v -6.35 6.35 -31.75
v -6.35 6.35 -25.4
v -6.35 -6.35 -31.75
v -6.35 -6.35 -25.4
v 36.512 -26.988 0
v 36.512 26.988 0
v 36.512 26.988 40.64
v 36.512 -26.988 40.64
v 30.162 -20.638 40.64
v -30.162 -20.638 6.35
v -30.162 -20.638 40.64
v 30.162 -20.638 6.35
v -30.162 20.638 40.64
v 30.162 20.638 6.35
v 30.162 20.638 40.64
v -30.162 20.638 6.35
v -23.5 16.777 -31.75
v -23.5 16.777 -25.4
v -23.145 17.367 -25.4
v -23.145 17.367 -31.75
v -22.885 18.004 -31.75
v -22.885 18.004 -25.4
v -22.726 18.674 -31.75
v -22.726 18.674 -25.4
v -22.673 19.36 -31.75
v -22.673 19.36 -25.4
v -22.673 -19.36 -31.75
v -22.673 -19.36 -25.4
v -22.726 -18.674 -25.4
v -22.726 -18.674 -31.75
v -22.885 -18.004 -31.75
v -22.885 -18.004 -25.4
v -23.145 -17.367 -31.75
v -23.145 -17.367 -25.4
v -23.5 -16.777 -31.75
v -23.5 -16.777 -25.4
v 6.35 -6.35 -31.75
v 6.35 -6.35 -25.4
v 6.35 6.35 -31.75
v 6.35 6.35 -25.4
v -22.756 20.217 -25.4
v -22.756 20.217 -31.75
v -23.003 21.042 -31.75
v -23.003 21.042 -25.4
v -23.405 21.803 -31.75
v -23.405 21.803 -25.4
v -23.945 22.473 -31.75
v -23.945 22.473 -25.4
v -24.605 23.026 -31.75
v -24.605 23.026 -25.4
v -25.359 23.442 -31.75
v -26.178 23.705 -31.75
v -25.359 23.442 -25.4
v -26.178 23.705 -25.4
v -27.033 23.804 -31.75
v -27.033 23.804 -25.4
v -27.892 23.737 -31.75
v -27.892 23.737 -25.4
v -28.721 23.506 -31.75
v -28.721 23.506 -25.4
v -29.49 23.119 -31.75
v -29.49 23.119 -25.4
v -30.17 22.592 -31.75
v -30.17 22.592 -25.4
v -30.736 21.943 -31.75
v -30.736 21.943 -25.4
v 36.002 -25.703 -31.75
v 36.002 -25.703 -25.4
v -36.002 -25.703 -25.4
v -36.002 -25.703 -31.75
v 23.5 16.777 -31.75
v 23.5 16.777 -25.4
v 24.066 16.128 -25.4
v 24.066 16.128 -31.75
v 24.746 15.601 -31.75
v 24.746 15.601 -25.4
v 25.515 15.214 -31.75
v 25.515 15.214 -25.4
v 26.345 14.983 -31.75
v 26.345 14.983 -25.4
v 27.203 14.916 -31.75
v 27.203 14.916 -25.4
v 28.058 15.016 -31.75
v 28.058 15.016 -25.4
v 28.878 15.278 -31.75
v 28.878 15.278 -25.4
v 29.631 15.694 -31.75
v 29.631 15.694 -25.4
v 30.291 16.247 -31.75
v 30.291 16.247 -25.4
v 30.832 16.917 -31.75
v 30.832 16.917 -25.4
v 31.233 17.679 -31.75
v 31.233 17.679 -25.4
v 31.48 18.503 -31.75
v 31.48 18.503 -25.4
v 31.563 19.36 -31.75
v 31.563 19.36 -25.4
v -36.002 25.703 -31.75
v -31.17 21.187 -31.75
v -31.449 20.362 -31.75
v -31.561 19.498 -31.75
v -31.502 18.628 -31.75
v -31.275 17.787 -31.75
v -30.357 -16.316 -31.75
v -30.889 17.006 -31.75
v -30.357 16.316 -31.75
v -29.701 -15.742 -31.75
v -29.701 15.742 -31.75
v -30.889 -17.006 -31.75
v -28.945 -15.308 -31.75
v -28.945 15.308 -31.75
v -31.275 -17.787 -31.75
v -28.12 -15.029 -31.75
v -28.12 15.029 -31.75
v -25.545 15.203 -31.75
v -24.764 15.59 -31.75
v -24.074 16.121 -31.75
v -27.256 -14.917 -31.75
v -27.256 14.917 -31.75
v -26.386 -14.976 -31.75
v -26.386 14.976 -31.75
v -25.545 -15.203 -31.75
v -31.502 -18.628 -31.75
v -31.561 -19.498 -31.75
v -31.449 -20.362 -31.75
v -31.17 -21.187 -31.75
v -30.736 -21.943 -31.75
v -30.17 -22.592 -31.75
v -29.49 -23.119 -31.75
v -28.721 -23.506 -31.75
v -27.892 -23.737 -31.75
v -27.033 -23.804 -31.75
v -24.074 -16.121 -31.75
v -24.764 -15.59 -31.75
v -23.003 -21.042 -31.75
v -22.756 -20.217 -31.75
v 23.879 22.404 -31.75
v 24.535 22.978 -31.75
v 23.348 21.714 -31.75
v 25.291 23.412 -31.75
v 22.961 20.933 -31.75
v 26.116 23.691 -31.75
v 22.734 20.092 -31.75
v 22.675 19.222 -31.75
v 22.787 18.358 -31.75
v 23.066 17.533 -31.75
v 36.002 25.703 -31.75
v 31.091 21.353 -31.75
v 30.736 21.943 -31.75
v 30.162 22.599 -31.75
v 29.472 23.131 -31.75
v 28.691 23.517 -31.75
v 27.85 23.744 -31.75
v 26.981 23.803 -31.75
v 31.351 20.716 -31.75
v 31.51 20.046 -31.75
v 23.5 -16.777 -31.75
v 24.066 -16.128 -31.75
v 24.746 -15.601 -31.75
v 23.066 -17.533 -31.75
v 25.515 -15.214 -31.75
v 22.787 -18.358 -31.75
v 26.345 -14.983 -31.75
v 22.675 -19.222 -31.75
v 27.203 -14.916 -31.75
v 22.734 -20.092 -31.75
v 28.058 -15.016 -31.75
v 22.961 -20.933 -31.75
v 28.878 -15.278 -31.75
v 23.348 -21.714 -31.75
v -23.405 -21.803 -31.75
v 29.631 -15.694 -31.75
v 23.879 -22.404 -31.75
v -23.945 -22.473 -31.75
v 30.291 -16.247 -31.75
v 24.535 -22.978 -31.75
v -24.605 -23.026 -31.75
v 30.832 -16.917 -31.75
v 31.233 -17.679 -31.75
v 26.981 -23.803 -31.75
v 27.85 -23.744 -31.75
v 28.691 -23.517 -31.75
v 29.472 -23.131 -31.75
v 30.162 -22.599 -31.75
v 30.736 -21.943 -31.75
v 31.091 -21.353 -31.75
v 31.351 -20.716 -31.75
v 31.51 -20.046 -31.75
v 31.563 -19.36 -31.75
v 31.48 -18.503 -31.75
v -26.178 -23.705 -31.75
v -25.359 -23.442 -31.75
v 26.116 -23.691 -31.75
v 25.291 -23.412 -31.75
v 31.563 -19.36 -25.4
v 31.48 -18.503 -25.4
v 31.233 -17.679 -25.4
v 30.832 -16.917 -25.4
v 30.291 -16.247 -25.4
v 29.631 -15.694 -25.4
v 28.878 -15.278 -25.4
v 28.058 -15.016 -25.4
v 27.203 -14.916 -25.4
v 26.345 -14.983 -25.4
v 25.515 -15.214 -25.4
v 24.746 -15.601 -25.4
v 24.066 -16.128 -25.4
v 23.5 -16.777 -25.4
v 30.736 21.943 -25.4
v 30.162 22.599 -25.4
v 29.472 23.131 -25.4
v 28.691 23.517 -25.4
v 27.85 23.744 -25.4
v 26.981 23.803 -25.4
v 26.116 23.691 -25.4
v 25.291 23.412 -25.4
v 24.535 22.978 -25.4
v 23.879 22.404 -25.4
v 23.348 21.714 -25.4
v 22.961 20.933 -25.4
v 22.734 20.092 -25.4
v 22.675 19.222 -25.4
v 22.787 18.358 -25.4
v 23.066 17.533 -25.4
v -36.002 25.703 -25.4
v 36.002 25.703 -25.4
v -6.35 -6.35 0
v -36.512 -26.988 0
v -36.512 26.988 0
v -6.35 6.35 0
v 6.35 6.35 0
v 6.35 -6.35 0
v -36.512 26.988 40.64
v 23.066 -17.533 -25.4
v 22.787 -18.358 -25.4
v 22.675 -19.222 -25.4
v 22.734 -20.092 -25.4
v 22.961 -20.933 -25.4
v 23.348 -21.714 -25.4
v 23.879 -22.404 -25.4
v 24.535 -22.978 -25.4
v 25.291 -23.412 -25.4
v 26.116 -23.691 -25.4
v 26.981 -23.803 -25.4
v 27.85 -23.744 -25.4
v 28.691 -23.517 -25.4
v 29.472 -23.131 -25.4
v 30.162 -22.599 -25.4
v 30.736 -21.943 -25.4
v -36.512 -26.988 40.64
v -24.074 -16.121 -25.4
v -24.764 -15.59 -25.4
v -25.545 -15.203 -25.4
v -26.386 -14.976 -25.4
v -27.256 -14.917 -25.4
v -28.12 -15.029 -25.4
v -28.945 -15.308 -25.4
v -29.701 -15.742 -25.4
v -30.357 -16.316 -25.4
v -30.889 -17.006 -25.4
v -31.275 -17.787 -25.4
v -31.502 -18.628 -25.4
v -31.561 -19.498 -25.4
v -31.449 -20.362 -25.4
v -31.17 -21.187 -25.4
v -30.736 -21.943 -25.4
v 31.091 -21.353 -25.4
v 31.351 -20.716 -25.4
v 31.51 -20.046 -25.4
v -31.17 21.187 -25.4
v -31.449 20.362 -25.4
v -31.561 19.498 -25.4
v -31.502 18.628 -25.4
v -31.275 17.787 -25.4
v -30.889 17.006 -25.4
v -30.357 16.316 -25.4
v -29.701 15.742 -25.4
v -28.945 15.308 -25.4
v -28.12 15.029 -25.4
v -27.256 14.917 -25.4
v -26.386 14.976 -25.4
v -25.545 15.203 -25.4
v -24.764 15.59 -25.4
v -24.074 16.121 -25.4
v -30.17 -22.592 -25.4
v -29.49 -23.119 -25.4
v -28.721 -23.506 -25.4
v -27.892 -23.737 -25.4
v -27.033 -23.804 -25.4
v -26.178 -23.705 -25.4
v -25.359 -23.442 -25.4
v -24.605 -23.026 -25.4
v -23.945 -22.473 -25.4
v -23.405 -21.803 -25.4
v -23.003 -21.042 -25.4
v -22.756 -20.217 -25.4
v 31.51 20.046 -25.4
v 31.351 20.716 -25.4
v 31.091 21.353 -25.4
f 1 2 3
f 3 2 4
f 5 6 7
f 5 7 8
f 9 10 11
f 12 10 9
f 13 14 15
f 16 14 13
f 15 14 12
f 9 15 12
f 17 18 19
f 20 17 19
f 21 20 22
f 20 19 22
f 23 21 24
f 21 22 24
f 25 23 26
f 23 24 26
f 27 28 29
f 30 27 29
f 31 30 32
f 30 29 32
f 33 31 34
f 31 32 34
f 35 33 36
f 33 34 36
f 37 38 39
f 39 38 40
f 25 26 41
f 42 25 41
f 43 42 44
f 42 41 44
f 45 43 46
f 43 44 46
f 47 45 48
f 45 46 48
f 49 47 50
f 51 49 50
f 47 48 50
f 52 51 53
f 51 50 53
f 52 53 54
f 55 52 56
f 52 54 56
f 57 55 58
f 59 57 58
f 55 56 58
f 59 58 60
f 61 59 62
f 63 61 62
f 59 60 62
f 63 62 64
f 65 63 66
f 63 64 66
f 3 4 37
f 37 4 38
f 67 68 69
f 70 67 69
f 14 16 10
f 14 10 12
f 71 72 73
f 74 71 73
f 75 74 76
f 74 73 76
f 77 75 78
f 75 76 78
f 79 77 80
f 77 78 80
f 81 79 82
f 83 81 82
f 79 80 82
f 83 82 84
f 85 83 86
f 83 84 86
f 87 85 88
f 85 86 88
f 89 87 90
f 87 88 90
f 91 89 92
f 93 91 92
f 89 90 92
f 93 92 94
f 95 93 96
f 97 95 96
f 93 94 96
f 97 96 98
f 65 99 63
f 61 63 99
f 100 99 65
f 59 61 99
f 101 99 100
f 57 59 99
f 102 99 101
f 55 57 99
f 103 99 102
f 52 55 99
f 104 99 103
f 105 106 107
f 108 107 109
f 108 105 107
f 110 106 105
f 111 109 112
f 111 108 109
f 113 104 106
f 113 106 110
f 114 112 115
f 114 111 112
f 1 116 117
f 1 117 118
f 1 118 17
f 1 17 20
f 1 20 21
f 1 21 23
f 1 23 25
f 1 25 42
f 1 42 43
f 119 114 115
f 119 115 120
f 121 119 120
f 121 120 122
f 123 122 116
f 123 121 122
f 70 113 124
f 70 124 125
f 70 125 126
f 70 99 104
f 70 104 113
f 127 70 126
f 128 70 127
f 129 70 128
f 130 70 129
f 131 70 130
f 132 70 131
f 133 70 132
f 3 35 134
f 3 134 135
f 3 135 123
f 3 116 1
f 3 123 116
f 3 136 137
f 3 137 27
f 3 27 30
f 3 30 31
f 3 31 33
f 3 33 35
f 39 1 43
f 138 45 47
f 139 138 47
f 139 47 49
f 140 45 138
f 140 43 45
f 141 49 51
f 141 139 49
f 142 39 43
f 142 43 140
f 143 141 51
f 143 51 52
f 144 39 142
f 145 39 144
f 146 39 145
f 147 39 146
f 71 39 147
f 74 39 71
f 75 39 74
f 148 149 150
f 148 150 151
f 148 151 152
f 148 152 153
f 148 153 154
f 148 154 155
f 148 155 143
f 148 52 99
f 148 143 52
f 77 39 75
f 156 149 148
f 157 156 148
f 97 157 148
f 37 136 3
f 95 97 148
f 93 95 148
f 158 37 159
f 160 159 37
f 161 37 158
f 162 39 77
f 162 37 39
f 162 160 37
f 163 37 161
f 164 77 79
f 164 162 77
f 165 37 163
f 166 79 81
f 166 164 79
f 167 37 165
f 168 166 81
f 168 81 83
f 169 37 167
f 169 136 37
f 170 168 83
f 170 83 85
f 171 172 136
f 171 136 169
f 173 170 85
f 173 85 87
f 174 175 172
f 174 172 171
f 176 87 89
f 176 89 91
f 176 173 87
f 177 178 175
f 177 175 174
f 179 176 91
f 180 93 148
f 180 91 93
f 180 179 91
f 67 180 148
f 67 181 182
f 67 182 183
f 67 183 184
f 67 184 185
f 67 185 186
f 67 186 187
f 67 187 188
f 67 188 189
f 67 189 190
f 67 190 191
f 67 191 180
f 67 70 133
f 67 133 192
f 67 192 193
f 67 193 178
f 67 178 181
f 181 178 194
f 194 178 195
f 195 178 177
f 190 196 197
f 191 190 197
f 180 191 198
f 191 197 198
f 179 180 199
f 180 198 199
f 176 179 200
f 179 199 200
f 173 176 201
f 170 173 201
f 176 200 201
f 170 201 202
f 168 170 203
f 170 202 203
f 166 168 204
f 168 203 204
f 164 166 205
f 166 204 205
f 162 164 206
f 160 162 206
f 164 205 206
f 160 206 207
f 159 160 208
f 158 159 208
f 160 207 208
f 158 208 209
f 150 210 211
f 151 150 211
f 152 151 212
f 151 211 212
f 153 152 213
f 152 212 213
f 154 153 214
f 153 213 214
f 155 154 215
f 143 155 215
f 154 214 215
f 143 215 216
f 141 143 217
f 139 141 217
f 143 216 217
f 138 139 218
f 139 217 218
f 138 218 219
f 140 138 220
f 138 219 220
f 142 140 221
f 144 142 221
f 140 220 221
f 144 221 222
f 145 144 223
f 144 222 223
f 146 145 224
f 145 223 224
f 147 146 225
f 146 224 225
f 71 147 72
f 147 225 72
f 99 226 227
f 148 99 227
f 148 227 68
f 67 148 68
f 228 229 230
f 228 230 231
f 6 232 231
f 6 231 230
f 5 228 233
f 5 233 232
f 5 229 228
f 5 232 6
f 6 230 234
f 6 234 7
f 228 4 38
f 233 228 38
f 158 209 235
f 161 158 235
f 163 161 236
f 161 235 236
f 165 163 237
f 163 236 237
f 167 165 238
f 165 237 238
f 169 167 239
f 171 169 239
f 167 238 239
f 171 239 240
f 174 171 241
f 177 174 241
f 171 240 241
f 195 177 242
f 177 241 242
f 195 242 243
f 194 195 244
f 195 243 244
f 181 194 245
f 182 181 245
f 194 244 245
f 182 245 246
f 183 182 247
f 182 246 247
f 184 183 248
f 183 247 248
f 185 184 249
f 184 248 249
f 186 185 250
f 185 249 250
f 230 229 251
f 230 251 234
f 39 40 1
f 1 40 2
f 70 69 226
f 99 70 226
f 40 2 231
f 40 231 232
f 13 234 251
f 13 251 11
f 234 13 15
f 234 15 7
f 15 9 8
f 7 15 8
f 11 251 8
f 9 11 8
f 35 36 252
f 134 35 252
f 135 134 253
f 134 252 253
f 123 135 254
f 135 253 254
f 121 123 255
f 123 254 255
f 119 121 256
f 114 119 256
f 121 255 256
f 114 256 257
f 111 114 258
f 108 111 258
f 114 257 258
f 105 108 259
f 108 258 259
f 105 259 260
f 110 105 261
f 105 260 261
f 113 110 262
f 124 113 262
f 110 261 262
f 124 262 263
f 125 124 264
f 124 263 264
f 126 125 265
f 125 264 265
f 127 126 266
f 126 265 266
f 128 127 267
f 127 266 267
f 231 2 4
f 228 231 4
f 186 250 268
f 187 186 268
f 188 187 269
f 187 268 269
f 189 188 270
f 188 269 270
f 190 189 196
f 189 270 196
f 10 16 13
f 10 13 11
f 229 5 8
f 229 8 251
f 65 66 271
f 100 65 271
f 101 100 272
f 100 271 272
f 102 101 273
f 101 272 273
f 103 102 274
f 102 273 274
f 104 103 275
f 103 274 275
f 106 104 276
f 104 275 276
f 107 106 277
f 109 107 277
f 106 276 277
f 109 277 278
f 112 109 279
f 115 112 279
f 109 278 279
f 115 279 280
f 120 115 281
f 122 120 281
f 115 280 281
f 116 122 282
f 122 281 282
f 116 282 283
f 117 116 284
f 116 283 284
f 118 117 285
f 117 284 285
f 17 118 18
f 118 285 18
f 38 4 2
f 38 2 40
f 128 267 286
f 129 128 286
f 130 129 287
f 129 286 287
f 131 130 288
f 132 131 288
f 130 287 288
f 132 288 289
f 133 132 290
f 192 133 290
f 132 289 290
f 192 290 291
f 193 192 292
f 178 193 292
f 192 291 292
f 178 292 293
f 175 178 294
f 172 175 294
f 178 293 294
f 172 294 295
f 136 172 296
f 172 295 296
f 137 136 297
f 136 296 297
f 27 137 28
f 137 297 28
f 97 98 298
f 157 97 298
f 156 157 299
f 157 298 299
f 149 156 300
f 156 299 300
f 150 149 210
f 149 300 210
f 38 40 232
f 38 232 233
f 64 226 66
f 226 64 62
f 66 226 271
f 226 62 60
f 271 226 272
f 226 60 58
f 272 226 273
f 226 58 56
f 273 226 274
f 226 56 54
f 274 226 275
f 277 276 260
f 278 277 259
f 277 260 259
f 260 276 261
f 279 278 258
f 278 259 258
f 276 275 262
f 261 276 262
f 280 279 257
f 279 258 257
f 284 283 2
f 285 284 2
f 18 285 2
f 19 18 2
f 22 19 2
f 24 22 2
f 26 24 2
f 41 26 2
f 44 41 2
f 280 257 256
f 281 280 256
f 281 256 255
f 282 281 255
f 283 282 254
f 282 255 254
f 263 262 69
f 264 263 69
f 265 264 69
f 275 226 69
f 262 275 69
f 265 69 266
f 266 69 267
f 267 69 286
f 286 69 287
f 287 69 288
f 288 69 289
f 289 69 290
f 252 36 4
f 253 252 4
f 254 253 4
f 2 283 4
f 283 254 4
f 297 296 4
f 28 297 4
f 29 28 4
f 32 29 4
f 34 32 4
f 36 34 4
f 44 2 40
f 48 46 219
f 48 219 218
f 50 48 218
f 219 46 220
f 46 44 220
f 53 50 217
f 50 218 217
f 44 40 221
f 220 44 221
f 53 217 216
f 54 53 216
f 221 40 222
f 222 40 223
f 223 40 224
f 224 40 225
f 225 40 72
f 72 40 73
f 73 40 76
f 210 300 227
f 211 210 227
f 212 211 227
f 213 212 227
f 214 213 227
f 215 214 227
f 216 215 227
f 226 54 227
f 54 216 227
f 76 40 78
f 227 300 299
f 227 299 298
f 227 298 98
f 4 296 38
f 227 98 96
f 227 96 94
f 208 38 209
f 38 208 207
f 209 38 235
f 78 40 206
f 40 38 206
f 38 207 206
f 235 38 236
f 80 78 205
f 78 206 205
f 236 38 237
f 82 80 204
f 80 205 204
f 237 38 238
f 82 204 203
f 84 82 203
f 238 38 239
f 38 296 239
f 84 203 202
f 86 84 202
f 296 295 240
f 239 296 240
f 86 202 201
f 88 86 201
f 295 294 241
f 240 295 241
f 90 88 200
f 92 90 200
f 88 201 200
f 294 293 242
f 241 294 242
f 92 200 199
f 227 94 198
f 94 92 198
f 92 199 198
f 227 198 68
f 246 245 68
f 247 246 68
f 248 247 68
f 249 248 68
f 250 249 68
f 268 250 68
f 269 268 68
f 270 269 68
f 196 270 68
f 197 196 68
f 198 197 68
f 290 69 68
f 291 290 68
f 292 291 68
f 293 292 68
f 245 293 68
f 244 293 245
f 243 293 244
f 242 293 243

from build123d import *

# Parameters (mm, degrees)
F0_W     = 60.325
F0_H     = 41.275
F1_DEPTH = 6.35
F2_W     = 12.7
F2_H     = 12.7
F3_DEPTH = 25.4
F5_DEPTH = 6.35
F6_W     = 6.35
F6_H     = 41.275
F7_DEPTH = 40.64


with BuildPart() as f1:
    # F0 (on Top) → F1 (new body)
    with BuildSketch(Plane.XY):
        Rectangle(F0_W, F0_H)
    extrude(amount=F1_DEPTH)

    # F2 (on face) → F3 (join)
    with BuildSketch(Plane(origin=(0, 0, 0), x_dir=(1, 0, 0), z_dir=(0, 0, -1))):
        Rectangle(F2_W, F2_H)
    extrude(amount=F3_DEPTH)

    # F6 (on face) → F7 (join)
    with BuildSketch(Plane(origin=(0, 0, 0), x_dir=(1, 0, 0), z_dir=(0, 0, -1))):
        with Locations((-33.3375, 0)):
            Rectangle(F6_W, F6_H)
        Polygon((-36.5125, 20.6375), (-30.1625, 20.6375), (30.1625, 20.6375), (36.5125, 20.6375), (36.5125, 26.9875), (-36.5125, 26.9875), align=None)
        Polygon((30.1625, -20.6375), (-30.1625, -20.6375), (-36.5125, -20.6375), (-36.5125, -26.9875), (36.5125, -26.9875), (36.5125, -20.6375), align=None)
        with Locations((33.3375, 0)):
            Rectangle(F6_W, F6_H)
    extrude(amount=-F7_DEPTH)


with BuildPart() as f5:
    # F4 (on face) → F5 (new body)
    with BuildSketch(Plane(origin=(0, 0, -25.4), x_dir=(1, 0, 0), z_dir=(0, 0, -1))):
        with BuildLine():
            Line((-36.002361, 25.702715), (-36.002361, -25.702715))
            Line((-36.002361, -25.702715), (-30.73576, -21.942797))
            ThreePointArc((-30.73576, -21.942797), (-29.700806, -15.7424), (-23.500409, -16.777353))
            Line((-23.500409, -16.777353), (-6.35, -4.533376))
            Line((-6.35, -4.533376), (-6.35, 4.533376))
            Line((-6.35, 4.533376), (-23.500409, 16.777353))
            ThreePointArc((-23.500409, 16.777353), (-29.700806, 15.7424), (-30.73576, 21.942797))
            Line((-30.73576, 21.942797), (-36.002361, 25.702715))
        make_face()
        with BuildLine():
            Line((36.002361, 25.702715), (-36.002361, 25.702715))
            Line((-36.002361, 25.702715), (-30.73576, 21.942797))
            ThreePointArc((-30.73576, 21.942797), (-25.762087, 23.593194), (-22.673085, 19.360075))
            ThreePointArc((-22.673085, 19.360075), (-22.884966, 18.004077), (-23.500409, 16.777353))
            Line((-23.500409, 16.777353), (-6.35, 4.533376))
            Line((-6.35, 4.533376), (-6.35, 6.35))
            Line((-6.35, 6.35), (6.35, 6.35))
            Line((6.35, 6.35), (6.35, 4.533376))
            Line((6.35, 4.533376), (23.500409, 16.777353))
            ThreePointArc((23.500409, 16.777353), (24.535363, 22.97775), (30.73576, 21.942797))
            Line((30.73576, 21.942797), (36.002361, 25.702715))
        make_face()
        with BuildLine():
            Line((30.73576, -21.942797), (36.002361, -25.702715))
            Line((36.002361, -25.702715), (36.002361, 25.702715))
            Line((36.002361, 25.702715), (30.73576, 21.942797))
            ThreePointArc((30.73576, 21.942797), (31.351203, 20.716072), (31.563085, 19.360075))
            ThreePointArc((31.563085, 19.360075), (28.474082, 15.126956), (23.500409, 16.777353))
            Line((23.500409, 16.777353), (6.35, 4.533376))
            Line((6.35, 4.533376), (6.35, -4.533376))
            Line((6.35, -4.533376), (23.500409, -16.777353))
            ThreePointArc((23.500409, -16.777353), (28.474082, -15.126956), (31.563085, -19.360075))
            ThreePointArc((31.563085, -19.360075), (31.351203, -20.716072), (30.73576, -21.942797))
        make_face()
        with BuildLine():
            Line((-30.73576, -21.942797), (-36.002361, -25.702715))
            Line((-36.002361, -25.702715), (36.002361, -25.702715))
            Line((36.002361, -25.702715), (30.73576, -21.942797))
            ThreePointArc((30.73576, -21.942797), (24.535363, -22.97775), (23.500409, -16.777353))
            Line((23.500409, -16.777353), (6.35, -4.533376))
            Line((6.35, -4.533376), (6.35, -6.35))
            Line((6.35, -6.35), (-6.35, -6.35))
            Line((-6.35, -6.35), (-6.35, -4.533376))
            Line((-6.35, -4.533376), (-23.500409, -16.777353))
            ThreePointArc((-23.500409, -16.777353), (-22.884966, -18.004077), (-22.673085, -19.360075))
            ThreePointArc((-22.673085, -19.360075), (-25.762087, -23.593194), (-30.73576, -21.942797))
        make_face()
    extrude(amount=F5_DEPTH)


solid = Compound([f1.part, f5.part])
